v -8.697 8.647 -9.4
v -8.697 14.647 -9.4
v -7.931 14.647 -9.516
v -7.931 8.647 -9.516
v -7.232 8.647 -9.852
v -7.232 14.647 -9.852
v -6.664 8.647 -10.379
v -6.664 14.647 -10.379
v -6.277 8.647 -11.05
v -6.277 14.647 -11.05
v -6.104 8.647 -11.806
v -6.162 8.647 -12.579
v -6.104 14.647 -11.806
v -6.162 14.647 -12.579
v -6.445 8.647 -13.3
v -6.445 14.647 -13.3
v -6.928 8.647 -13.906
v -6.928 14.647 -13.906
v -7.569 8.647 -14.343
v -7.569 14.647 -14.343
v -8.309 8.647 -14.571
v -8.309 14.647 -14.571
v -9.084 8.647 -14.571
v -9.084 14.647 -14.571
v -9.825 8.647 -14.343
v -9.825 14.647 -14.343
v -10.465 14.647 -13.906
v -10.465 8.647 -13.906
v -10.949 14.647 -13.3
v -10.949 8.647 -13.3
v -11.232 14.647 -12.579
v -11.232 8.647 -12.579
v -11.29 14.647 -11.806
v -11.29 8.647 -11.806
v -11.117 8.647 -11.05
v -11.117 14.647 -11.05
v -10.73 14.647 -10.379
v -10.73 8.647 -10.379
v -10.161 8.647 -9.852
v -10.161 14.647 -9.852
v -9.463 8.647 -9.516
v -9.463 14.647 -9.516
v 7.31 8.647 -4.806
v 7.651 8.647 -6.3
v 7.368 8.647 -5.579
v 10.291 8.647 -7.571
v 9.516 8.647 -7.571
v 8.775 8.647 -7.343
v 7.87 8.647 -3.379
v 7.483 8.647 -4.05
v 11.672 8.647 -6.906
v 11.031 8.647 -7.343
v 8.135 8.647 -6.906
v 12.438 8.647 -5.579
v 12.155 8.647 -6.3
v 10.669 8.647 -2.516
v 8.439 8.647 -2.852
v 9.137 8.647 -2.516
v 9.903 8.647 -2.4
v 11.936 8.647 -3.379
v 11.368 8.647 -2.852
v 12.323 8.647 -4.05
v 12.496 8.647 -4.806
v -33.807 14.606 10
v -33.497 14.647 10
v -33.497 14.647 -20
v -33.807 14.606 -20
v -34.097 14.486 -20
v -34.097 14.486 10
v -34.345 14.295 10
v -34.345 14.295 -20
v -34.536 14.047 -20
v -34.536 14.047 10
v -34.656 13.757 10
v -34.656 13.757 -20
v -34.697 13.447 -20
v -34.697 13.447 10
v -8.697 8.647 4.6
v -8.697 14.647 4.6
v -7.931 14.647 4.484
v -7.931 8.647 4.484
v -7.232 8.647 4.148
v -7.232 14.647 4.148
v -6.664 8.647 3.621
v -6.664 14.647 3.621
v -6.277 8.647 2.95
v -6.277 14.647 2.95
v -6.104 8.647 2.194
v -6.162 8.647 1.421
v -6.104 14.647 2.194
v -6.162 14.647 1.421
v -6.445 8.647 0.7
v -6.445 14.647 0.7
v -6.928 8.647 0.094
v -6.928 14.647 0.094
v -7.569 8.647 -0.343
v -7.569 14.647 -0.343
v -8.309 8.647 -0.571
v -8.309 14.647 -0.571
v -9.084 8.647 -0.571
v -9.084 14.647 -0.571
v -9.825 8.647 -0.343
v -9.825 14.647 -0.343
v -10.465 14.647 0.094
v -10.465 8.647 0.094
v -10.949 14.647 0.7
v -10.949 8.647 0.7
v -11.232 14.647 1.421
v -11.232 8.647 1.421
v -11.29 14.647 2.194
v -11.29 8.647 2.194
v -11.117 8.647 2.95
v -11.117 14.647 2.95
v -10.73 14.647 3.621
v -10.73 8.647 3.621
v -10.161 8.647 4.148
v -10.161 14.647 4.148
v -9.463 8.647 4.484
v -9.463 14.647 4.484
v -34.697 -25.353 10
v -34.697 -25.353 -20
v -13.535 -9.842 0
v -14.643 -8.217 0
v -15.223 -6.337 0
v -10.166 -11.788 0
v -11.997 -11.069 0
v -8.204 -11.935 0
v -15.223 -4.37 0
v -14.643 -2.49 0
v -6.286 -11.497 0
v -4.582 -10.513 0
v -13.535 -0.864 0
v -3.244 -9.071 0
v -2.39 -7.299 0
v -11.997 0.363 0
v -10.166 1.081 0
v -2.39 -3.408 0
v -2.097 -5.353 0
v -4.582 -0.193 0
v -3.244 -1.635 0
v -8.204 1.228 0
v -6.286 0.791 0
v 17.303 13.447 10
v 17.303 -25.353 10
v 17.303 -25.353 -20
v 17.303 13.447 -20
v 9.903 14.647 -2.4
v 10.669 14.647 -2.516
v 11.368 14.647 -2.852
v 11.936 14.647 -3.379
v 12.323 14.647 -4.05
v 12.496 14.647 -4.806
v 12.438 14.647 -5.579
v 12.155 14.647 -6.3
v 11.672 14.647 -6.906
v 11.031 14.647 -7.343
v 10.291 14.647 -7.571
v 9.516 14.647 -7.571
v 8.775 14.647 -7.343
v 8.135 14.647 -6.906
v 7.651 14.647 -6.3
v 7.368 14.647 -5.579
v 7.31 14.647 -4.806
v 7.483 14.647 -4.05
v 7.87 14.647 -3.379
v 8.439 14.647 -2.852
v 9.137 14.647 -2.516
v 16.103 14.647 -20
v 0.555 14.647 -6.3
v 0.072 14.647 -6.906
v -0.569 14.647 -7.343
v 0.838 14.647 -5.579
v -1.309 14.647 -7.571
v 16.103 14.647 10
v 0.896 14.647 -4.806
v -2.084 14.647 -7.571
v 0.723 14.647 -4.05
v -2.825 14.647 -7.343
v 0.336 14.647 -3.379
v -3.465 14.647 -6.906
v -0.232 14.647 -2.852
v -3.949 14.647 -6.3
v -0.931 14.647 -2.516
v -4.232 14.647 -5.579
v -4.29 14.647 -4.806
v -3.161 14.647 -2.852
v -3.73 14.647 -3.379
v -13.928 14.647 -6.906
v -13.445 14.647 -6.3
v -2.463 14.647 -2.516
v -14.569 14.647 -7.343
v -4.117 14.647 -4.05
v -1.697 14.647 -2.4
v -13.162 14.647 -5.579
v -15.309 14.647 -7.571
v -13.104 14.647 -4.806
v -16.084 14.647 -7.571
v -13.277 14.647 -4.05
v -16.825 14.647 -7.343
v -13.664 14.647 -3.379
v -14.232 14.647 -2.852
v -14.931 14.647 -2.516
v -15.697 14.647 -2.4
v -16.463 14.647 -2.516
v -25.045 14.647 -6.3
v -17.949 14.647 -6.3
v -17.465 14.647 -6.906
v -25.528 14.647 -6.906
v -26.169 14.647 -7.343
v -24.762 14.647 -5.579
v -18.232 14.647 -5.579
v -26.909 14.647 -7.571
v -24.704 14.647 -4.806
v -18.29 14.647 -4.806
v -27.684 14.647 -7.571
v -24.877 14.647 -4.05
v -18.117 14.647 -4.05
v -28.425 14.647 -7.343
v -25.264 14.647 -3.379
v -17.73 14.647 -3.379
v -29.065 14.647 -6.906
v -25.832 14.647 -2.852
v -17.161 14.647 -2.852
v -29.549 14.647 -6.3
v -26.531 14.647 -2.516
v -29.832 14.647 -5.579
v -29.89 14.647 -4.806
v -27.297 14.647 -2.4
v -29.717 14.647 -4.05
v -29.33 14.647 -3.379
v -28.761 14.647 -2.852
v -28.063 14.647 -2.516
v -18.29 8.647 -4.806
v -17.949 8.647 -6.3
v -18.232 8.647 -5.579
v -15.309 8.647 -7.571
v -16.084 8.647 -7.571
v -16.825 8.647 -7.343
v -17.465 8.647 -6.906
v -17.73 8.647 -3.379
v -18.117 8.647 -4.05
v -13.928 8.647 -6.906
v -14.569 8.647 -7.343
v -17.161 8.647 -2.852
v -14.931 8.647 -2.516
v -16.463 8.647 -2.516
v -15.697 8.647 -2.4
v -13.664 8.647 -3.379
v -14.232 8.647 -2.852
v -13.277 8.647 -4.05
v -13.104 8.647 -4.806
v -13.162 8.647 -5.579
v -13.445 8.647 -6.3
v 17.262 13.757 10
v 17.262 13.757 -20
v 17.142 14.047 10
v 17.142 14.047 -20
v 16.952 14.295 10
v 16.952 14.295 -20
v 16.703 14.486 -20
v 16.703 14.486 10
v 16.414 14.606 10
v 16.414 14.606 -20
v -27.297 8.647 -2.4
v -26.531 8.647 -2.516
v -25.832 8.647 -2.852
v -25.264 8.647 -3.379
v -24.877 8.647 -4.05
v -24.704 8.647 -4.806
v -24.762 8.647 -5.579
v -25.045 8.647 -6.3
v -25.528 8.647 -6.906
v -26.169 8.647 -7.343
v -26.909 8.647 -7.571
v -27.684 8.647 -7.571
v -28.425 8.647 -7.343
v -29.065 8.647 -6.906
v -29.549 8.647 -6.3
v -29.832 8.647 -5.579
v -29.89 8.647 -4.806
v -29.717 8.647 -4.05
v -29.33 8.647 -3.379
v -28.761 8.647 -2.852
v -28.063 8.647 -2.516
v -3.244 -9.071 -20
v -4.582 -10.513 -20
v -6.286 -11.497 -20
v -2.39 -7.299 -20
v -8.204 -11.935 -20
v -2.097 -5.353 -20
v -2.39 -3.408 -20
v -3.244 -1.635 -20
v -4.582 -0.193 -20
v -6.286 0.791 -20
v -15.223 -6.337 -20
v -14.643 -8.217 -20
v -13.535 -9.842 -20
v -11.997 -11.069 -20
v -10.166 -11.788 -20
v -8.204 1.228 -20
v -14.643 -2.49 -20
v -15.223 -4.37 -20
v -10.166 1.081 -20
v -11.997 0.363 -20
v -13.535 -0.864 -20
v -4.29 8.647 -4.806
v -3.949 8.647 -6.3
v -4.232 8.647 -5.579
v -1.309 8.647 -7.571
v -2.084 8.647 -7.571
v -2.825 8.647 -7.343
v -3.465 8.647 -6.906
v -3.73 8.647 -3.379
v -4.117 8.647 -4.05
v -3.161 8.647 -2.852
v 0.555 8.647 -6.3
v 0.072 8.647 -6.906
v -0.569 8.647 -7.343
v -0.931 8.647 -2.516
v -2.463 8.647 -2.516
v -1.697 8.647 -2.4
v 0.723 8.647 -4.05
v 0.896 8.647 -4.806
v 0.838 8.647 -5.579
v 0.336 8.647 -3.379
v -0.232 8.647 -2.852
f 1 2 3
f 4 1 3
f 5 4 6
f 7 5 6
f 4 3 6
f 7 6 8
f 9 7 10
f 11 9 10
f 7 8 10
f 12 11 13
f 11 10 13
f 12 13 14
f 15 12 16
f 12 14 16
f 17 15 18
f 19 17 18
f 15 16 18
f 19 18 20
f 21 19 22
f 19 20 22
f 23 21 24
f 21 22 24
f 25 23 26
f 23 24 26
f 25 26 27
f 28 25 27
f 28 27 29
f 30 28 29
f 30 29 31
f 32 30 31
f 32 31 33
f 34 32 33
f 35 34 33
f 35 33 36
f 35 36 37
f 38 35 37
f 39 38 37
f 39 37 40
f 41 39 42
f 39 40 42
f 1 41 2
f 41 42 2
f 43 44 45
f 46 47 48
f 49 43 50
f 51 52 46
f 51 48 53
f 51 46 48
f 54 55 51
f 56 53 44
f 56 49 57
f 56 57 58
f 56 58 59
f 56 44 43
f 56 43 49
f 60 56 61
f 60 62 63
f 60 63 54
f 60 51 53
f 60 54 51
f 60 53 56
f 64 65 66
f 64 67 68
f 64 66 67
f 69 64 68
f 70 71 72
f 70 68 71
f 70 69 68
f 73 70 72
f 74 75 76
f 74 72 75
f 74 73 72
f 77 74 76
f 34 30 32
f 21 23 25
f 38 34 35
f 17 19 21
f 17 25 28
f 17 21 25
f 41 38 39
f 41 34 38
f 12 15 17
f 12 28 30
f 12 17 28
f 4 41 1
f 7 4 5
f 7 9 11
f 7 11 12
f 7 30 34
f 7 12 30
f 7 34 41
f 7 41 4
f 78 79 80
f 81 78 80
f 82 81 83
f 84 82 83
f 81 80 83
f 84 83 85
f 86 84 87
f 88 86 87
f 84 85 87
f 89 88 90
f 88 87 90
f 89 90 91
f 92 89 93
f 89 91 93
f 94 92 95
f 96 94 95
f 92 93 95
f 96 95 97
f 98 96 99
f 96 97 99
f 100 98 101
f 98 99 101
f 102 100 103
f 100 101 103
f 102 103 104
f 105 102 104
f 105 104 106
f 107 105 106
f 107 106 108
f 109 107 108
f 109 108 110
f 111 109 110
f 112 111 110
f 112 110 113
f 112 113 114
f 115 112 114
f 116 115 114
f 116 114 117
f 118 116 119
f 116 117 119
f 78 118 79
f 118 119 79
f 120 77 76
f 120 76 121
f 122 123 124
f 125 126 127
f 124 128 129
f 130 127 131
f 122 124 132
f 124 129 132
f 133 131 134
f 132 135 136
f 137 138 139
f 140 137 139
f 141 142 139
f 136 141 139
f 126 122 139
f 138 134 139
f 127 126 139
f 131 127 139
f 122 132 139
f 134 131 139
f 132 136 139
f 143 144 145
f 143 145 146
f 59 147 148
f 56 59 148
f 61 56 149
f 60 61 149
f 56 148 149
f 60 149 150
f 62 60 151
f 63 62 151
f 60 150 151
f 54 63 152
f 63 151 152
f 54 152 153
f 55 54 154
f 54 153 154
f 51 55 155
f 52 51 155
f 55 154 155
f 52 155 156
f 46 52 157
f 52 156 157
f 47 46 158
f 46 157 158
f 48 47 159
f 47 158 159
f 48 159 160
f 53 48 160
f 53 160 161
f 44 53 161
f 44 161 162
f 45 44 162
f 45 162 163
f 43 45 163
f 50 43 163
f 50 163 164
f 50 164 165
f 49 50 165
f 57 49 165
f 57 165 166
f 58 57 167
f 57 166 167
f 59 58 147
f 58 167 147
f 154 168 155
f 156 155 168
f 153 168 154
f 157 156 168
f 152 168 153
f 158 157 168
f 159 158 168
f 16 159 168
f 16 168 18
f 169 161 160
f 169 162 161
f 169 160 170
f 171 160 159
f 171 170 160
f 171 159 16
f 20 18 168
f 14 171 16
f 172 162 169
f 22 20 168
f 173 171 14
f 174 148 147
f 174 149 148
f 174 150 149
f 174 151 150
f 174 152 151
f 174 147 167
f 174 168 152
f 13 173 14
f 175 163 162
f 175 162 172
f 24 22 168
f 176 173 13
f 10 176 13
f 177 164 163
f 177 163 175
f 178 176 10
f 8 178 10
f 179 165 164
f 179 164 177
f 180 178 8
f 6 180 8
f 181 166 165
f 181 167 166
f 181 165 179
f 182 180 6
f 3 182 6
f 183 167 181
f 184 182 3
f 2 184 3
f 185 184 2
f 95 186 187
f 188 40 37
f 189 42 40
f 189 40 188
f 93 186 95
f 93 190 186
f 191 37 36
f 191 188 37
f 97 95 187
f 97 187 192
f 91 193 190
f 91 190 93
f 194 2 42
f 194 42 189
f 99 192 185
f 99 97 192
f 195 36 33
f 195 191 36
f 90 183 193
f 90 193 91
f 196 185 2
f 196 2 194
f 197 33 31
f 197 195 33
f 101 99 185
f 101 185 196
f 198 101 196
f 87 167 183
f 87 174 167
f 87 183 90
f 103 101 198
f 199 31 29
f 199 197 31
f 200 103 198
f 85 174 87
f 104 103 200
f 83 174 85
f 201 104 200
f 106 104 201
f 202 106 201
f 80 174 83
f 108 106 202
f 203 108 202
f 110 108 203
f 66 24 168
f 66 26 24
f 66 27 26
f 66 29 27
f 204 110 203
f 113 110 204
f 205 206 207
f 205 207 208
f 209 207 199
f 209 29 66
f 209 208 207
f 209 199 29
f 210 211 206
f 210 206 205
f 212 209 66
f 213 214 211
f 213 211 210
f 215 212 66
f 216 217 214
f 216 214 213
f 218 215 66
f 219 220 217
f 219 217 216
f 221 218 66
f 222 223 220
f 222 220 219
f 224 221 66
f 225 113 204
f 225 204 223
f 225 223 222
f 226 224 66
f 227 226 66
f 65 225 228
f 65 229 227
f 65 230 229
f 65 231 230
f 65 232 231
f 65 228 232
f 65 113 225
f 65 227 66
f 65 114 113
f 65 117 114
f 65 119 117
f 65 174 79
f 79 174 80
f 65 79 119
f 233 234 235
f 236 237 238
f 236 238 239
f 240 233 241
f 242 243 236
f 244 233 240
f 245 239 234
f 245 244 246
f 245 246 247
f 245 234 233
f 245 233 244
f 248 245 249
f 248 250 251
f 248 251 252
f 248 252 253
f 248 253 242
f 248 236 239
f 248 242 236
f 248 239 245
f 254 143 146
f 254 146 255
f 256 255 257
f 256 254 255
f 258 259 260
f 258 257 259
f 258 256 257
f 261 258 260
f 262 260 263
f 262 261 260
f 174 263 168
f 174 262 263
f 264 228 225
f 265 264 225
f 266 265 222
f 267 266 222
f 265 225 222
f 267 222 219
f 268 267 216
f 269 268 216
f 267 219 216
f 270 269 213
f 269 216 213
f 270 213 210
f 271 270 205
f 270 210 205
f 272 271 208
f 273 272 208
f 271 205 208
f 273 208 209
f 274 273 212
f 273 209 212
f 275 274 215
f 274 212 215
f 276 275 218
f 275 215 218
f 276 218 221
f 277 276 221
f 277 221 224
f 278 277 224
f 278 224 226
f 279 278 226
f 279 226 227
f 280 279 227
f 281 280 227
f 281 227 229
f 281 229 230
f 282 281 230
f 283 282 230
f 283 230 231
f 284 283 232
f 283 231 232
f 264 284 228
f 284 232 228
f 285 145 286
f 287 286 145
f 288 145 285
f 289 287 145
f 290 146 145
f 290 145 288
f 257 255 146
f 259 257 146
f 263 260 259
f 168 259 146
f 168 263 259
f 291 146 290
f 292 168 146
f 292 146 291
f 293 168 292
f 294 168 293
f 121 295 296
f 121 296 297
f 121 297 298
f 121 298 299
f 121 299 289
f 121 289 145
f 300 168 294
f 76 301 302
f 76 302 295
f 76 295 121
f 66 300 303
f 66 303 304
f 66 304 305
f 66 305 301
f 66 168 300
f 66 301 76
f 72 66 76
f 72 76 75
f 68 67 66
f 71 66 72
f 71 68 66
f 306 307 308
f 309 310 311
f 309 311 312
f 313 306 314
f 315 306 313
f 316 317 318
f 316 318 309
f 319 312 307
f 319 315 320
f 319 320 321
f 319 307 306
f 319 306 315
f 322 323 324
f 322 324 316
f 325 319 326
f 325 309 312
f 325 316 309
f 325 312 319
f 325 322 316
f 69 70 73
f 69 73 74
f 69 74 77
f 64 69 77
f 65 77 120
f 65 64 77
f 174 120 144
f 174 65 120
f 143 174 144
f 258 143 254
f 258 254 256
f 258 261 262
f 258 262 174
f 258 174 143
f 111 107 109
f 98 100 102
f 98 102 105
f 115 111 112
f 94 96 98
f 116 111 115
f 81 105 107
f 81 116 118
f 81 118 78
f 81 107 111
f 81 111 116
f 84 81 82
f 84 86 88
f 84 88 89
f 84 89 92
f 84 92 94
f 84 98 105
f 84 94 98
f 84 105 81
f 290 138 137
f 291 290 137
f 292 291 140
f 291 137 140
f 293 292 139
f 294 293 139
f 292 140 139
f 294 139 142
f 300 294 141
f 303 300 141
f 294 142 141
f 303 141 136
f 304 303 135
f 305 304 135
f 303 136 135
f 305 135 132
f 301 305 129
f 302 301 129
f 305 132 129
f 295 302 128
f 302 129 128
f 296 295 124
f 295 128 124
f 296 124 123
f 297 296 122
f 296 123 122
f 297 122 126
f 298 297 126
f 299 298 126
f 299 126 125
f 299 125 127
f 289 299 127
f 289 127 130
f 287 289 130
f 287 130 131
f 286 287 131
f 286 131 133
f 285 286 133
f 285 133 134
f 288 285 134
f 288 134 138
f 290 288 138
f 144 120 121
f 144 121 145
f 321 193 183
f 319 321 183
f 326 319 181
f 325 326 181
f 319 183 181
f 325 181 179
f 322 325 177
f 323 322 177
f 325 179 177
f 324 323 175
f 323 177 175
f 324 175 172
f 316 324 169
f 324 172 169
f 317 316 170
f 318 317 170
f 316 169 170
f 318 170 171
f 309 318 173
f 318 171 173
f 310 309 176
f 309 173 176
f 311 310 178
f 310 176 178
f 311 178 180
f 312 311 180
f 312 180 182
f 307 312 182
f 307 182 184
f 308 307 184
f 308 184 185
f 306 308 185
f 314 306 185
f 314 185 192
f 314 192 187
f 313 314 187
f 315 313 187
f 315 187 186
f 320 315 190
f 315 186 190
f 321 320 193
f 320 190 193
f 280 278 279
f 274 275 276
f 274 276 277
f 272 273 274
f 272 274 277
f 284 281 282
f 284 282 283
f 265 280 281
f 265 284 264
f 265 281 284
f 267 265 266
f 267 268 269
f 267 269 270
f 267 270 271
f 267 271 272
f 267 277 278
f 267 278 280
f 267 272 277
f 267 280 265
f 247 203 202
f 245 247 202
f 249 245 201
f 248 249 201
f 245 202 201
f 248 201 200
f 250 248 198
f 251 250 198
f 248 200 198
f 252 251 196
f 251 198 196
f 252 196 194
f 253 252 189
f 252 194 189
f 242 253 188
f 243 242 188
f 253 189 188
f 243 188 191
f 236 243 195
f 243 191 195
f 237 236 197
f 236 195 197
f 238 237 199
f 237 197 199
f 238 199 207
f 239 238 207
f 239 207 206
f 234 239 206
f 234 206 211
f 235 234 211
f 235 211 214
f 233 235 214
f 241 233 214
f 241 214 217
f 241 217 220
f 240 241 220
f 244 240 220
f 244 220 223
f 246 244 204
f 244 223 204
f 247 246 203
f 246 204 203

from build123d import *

# Parameters (mm, degrees)
BOSS_EXTRUDE1_DEPTH = 20
BOSS_EXTRUDE2_START = 10
BOSS_EXTRUDE2_DEPTH = 10
SKETCH4_R           = 2.6
CUT_EXTRUDE2_DEPTH  = 6
CUT_EXTRUDE3_REACH  = 49.399
SKETCH2_R           = 6.6


with BuildPart() as part:
    # Sketch1 → Boss-Extrude1 (new body)
    with BuildSketch(Plane.XY):
        with BuildLine():
            Line((-33.49686368, 14.646798017), (16.10313632, 14.646798017))
            ThreePointArc((16.10313632, 14.646798017), (16.951664458, 14.295326155), (17.30313632, 13.446798017))
            Line((17.30313632, 13.446798017), (17.30313632, -25.353201983))
            Line((17.30313632, -25.353201983), (-34.69686368, -25.353201983))
            Line((-34.69686368, -25.353201983), (-34.69686368, 13.446798017))
            ThreePointArc((-34.69686368, 13.446798017), (-34.345391817, 14.295326155), (-33.49686368, 14.646798017))
        make_face()
    extrude(amount=-BOSS_EXTRUDE1_DEPTH)

    # Sketch3 → Boss-Extrude2 (add)
    with BuildSketch(Plane.XY.offset(BOSS_EXTRUDE2_START)):
        with BuildLine():
            Line((17.30313632, -25.353201983), (17.30313632, 13.446798017))
            ThreePointArc((17.30313632, 13.446798017), (16.951664458, 14.295326155), (16.10313632, 14.646798017))
            Line((16.10313632, 14.646798017), (-33.49686368, 14.646798017))
            ThreePointArc((-33.49686368, 14.646798017), (-34.345391817, 14.295326155), (-34.69686368, 13.446798017))
            Line((-34.69686368, 13.446798017), (-34.69686368, -25.353201983))
            Line((-34.69686368, -25.353201983), (17.30313632, -25.353201983))
        make_face()
    extrude(amount=-BOSS_EXTRUDE2_DEPTH)

    # Sketch4 → Cut-Extrude2 (cut)
    with BuildSketch(Plane(origin=(0, 14.646798017, 0), x_dir=(1, 0, 0), z_dir=(0, 1, 0))):
        with Locations(Location((-27.29686368, 5, 0), (0, 0, 270))):
            Circle(SKETCH4_R)
        with Locations(Location((-15.69686368, 5, 0), (0, 0, 270))):
            Circle(SKETCH4_R)
        with Locations(Location((-8.69686368, 12, 0), (0, 0, 270))):
            Circle(SKETCH4_R)
        with Locations(Location((-8.69686368, -2, 0), (0, 0, 270))):
            Circle(SKETCH4_R)
        with Locations(Location((-1.69686368, 5, 0), (0, 0, 270))):
            Circle(SKETCH4_R)
        with Locations(Location((9.90313632, 5, 0), (0, 0, 270))):
            Circle(SKETCH4_R)
    extrude(amount=-CUT_EXTRUDE2_DEPTH, mode=Mode.SUBTRACT)

    # Sketch2 → Cut-Extrude3 (cut, up to next)
    with BuildSketch(Plane.XY, mode=Mode.PRIVATE) as cut_extrude3_sk1:
        with Locations((-8.69686368, -5.353201983)):
            Circle(SKETCH2_R)
    cut_extrude3_tool1 = extrude(cut_extrude3_sk1.sketch, amount=-CUT_EXTRUDE3_REACH, mode=Mode.PRIVATE) & part.part
    add(cut_extrude3_tool1.solids().sort_by_distance((-8.696864, -5.353202, 0))[0], mode=Mode.SUBTRACT)


solid = part.part
